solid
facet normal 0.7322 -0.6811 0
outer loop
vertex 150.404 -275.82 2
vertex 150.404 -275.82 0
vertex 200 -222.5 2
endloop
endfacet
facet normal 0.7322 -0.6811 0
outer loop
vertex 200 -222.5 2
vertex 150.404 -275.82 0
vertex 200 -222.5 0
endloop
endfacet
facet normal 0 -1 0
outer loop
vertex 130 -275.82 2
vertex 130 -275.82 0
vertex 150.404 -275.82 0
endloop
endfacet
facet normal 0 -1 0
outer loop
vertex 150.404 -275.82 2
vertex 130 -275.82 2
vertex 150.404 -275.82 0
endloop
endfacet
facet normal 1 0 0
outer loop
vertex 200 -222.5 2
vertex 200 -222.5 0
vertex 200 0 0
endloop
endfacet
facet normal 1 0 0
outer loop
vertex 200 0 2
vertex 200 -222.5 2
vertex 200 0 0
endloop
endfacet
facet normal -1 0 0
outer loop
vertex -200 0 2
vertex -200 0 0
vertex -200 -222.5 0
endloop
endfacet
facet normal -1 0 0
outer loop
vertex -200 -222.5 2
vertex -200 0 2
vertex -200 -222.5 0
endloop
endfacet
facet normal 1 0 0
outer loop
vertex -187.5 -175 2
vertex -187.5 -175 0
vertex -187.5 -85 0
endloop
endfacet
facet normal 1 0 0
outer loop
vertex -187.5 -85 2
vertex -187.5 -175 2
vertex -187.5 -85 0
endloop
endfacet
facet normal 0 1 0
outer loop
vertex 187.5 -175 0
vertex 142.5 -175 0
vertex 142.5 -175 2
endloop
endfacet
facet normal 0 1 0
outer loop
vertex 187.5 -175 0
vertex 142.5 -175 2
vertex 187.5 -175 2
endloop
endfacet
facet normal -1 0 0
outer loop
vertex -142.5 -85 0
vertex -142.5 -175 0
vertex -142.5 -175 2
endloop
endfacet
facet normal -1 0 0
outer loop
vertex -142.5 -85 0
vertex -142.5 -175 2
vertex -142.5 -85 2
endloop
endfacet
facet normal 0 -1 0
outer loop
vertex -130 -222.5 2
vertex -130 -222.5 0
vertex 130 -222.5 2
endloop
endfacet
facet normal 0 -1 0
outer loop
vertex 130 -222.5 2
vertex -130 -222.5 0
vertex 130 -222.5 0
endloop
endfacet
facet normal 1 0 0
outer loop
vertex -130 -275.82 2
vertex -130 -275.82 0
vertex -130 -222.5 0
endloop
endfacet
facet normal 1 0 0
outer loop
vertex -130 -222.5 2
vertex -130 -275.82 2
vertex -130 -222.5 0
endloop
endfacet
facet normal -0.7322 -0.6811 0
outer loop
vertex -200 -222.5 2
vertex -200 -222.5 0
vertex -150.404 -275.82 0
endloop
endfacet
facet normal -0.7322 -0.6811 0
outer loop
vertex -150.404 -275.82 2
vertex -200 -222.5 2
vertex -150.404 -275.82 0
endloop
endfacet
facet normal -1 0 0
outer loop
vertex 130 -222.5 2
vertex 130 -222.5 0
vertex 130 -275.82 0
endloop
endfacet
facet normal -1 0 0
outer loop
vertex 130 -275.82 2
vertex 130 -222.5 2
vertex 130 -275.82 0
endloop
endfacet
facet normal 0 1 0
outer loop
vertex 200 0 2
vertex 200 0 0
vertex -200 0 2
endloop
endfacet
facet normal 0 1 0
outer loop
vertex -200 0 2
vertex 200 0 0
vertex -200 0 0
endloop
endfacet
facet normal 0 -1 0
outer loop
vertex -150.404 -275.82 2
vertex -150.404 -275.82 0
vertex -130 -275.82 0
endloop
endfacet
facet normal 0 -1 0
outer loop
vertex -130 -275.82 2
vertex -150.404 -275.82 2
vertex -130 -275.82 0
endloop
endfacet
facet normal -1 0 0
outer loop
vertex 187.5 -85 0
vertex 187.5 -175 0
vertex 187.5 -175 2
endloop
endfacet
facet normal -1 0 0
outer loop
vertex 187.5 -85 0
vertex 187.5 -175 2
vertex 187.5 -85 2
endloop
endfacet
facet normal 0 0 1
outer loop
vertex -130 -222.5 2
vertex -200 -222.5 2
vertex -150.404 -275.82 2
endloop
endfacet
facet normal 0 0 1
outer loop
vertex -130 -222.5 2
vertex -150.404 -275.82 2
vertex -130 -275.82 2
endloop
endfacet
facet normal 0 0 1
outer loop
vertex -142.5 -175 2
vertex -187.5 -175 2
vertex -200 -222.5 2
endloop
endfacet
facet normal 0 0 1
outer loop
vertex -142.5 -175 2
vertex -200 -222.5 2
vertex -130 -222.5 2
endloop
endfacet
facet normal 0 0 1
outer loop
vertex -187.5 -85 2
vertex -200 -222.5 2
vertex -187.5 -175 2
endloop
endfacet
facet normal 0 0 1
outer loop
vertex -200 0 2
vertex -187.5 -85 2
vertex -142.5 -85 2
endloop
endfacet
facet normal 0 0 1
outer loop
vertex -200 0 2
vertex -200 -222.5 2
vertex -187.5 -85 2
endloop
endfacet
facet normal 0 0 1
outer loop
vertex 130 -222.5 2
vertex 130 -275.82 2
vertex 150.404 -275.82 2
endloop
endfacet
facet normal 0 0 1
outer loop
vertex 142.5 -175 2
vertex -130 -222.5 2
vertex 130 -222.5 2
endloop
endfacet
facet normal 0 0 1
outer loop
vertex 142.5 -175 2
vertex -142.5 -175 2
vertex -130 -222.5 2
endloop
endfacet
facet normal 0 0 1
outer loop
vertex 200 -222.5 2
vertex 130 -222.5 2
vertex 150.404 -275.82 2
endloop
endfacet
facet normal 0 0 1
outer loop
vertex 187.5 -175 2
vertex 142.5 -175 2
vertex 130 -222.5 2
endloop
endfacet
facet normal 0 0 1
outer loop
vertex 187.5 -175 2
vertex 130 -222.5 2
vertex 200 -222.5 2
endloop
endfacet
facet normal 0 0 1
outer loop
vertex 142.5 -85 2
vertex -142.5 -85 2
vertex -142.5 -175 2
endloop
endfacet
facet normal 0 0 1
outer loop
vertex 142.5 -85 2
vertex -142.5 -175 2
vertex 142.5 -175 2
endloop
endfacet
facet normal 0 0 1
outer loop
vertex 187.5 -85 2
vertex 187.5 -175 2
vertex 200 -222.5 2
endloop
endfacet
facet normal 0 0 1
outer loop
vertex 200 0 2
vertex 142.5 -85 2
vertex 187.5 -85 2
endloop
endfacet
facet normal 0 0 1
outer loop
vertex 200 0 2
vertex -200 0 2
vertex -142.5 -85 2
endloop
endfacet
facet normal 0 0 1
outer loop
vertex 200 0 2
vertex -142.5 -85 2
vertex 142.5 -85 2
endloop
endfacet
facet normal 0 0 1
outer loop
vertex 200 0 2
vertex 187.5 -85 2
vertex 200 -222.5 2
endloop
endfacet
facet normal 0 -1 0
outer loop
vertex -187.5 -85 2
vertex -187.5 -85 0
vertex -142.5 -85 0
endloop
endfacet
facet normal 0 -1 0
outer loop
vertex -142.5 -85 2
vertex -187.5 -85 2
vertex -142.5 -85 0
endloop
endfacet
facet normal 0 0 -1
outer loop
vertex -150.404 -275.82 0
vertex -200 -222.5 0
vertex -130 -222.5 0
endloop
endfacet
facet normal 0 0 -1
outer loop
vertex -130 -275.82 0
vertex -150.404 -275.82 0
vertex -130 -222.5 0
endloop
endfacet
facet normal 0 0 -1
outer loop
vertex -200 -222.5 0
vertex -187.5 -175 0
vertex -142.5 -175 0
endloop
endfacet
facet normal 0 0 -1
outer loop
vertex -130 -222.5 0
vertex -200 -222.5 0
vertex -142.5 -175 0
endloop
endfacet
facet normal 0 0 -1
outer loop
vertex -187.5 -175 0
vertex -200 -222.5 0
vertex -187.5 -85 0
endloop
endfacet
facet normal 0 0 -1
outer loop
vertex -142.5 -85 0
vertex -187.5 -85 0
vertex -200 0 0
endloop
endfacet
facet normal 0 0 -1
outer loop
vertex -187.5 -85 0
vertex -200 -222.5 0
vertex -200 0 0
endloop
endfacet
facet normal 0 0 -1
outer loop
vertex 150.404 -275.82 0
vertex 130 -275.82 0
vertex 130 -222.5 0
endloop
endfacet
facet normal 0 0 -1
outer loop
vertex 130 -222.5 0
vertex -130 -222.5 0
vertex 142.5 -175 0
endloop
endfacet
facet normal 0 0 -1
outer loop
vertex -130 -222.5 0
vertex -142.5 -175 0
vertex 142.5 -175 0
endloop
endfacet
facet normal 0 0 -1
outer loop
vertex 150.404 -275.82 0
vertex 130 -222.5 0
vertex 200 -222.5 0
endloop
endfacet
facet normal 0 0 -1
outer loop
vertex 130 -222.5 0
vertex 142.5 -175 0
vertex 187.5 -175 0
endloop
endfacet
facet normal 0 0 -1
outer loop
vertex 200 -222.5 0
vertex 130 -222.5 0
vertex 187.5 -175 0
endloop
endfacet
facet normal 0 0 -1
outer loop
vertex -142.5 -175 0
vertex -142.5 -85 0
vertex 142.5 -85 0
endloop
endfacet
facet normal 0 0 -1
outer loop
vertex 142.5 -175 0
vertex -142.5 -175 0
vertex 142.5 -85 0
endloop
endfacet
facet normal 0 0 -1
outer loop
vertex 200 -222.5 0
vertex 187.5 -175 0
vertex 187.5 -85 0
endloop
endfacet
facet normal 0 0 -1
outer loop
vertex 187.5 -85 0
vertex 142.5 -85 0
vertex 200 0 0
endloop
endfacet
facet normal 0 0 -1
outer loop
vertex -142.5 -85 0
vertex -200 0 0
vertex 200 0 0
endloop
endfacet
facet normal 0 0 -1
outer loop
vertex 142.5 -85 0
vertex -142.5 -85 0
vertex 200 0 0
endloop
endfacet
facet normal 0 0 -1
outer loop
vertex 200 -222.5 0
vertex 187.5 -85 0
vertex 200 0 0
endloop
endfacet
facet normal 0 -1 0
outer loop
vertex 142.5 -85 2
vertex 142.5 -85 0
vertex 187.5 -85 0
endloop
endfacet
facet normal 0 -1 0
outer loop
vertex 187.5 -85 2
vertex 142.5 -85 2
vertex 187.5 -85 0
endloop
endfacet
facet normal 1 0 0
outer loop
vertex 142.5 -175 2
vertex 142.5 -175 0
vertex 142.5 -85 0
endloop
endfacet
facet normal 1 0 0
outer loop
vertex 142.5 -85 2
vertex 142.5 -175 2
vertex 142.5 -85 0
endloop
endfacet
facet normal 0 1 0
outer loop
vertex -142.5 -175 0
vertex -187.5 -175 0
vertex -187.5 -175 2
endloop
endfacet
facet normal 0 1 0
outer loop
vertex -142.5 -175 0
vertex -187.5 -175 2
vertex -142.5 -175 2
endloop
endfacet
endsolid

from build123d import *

# Parameters (mm, degrees)
SKETCH1_W           = 45
SKETCH1_H           = 90
BOSS_EXTRUDE1_DEPTH = 2


with BuildPart() as part:
    # Sketch1 → Boss-Extrude1 (new body)
    with BuildSketch(Plane.XY):
        Polygon((200, 0), (-200, 0), (-200, -222.5), (-150.404334867, -275.82), (-130, -275.82), (-130, -222.5), (130, -222.5), (130, -275.82), (150.404334867, -275.82), (200, -222.5), align=None)
        with Locations((-165, -130)):
            Rectangle(SKETCH1_W, SKETCH1_H, mode=Mode.SUBTRACT)
        with Locations((165, -130)):
            Rectangle(SKETCH1_W, SKETCH1_H, mode=Mode.SUBTRACT)
    extrude(amount=BOSS_EXTRUDE1_DEPTH)


solid = part.part
